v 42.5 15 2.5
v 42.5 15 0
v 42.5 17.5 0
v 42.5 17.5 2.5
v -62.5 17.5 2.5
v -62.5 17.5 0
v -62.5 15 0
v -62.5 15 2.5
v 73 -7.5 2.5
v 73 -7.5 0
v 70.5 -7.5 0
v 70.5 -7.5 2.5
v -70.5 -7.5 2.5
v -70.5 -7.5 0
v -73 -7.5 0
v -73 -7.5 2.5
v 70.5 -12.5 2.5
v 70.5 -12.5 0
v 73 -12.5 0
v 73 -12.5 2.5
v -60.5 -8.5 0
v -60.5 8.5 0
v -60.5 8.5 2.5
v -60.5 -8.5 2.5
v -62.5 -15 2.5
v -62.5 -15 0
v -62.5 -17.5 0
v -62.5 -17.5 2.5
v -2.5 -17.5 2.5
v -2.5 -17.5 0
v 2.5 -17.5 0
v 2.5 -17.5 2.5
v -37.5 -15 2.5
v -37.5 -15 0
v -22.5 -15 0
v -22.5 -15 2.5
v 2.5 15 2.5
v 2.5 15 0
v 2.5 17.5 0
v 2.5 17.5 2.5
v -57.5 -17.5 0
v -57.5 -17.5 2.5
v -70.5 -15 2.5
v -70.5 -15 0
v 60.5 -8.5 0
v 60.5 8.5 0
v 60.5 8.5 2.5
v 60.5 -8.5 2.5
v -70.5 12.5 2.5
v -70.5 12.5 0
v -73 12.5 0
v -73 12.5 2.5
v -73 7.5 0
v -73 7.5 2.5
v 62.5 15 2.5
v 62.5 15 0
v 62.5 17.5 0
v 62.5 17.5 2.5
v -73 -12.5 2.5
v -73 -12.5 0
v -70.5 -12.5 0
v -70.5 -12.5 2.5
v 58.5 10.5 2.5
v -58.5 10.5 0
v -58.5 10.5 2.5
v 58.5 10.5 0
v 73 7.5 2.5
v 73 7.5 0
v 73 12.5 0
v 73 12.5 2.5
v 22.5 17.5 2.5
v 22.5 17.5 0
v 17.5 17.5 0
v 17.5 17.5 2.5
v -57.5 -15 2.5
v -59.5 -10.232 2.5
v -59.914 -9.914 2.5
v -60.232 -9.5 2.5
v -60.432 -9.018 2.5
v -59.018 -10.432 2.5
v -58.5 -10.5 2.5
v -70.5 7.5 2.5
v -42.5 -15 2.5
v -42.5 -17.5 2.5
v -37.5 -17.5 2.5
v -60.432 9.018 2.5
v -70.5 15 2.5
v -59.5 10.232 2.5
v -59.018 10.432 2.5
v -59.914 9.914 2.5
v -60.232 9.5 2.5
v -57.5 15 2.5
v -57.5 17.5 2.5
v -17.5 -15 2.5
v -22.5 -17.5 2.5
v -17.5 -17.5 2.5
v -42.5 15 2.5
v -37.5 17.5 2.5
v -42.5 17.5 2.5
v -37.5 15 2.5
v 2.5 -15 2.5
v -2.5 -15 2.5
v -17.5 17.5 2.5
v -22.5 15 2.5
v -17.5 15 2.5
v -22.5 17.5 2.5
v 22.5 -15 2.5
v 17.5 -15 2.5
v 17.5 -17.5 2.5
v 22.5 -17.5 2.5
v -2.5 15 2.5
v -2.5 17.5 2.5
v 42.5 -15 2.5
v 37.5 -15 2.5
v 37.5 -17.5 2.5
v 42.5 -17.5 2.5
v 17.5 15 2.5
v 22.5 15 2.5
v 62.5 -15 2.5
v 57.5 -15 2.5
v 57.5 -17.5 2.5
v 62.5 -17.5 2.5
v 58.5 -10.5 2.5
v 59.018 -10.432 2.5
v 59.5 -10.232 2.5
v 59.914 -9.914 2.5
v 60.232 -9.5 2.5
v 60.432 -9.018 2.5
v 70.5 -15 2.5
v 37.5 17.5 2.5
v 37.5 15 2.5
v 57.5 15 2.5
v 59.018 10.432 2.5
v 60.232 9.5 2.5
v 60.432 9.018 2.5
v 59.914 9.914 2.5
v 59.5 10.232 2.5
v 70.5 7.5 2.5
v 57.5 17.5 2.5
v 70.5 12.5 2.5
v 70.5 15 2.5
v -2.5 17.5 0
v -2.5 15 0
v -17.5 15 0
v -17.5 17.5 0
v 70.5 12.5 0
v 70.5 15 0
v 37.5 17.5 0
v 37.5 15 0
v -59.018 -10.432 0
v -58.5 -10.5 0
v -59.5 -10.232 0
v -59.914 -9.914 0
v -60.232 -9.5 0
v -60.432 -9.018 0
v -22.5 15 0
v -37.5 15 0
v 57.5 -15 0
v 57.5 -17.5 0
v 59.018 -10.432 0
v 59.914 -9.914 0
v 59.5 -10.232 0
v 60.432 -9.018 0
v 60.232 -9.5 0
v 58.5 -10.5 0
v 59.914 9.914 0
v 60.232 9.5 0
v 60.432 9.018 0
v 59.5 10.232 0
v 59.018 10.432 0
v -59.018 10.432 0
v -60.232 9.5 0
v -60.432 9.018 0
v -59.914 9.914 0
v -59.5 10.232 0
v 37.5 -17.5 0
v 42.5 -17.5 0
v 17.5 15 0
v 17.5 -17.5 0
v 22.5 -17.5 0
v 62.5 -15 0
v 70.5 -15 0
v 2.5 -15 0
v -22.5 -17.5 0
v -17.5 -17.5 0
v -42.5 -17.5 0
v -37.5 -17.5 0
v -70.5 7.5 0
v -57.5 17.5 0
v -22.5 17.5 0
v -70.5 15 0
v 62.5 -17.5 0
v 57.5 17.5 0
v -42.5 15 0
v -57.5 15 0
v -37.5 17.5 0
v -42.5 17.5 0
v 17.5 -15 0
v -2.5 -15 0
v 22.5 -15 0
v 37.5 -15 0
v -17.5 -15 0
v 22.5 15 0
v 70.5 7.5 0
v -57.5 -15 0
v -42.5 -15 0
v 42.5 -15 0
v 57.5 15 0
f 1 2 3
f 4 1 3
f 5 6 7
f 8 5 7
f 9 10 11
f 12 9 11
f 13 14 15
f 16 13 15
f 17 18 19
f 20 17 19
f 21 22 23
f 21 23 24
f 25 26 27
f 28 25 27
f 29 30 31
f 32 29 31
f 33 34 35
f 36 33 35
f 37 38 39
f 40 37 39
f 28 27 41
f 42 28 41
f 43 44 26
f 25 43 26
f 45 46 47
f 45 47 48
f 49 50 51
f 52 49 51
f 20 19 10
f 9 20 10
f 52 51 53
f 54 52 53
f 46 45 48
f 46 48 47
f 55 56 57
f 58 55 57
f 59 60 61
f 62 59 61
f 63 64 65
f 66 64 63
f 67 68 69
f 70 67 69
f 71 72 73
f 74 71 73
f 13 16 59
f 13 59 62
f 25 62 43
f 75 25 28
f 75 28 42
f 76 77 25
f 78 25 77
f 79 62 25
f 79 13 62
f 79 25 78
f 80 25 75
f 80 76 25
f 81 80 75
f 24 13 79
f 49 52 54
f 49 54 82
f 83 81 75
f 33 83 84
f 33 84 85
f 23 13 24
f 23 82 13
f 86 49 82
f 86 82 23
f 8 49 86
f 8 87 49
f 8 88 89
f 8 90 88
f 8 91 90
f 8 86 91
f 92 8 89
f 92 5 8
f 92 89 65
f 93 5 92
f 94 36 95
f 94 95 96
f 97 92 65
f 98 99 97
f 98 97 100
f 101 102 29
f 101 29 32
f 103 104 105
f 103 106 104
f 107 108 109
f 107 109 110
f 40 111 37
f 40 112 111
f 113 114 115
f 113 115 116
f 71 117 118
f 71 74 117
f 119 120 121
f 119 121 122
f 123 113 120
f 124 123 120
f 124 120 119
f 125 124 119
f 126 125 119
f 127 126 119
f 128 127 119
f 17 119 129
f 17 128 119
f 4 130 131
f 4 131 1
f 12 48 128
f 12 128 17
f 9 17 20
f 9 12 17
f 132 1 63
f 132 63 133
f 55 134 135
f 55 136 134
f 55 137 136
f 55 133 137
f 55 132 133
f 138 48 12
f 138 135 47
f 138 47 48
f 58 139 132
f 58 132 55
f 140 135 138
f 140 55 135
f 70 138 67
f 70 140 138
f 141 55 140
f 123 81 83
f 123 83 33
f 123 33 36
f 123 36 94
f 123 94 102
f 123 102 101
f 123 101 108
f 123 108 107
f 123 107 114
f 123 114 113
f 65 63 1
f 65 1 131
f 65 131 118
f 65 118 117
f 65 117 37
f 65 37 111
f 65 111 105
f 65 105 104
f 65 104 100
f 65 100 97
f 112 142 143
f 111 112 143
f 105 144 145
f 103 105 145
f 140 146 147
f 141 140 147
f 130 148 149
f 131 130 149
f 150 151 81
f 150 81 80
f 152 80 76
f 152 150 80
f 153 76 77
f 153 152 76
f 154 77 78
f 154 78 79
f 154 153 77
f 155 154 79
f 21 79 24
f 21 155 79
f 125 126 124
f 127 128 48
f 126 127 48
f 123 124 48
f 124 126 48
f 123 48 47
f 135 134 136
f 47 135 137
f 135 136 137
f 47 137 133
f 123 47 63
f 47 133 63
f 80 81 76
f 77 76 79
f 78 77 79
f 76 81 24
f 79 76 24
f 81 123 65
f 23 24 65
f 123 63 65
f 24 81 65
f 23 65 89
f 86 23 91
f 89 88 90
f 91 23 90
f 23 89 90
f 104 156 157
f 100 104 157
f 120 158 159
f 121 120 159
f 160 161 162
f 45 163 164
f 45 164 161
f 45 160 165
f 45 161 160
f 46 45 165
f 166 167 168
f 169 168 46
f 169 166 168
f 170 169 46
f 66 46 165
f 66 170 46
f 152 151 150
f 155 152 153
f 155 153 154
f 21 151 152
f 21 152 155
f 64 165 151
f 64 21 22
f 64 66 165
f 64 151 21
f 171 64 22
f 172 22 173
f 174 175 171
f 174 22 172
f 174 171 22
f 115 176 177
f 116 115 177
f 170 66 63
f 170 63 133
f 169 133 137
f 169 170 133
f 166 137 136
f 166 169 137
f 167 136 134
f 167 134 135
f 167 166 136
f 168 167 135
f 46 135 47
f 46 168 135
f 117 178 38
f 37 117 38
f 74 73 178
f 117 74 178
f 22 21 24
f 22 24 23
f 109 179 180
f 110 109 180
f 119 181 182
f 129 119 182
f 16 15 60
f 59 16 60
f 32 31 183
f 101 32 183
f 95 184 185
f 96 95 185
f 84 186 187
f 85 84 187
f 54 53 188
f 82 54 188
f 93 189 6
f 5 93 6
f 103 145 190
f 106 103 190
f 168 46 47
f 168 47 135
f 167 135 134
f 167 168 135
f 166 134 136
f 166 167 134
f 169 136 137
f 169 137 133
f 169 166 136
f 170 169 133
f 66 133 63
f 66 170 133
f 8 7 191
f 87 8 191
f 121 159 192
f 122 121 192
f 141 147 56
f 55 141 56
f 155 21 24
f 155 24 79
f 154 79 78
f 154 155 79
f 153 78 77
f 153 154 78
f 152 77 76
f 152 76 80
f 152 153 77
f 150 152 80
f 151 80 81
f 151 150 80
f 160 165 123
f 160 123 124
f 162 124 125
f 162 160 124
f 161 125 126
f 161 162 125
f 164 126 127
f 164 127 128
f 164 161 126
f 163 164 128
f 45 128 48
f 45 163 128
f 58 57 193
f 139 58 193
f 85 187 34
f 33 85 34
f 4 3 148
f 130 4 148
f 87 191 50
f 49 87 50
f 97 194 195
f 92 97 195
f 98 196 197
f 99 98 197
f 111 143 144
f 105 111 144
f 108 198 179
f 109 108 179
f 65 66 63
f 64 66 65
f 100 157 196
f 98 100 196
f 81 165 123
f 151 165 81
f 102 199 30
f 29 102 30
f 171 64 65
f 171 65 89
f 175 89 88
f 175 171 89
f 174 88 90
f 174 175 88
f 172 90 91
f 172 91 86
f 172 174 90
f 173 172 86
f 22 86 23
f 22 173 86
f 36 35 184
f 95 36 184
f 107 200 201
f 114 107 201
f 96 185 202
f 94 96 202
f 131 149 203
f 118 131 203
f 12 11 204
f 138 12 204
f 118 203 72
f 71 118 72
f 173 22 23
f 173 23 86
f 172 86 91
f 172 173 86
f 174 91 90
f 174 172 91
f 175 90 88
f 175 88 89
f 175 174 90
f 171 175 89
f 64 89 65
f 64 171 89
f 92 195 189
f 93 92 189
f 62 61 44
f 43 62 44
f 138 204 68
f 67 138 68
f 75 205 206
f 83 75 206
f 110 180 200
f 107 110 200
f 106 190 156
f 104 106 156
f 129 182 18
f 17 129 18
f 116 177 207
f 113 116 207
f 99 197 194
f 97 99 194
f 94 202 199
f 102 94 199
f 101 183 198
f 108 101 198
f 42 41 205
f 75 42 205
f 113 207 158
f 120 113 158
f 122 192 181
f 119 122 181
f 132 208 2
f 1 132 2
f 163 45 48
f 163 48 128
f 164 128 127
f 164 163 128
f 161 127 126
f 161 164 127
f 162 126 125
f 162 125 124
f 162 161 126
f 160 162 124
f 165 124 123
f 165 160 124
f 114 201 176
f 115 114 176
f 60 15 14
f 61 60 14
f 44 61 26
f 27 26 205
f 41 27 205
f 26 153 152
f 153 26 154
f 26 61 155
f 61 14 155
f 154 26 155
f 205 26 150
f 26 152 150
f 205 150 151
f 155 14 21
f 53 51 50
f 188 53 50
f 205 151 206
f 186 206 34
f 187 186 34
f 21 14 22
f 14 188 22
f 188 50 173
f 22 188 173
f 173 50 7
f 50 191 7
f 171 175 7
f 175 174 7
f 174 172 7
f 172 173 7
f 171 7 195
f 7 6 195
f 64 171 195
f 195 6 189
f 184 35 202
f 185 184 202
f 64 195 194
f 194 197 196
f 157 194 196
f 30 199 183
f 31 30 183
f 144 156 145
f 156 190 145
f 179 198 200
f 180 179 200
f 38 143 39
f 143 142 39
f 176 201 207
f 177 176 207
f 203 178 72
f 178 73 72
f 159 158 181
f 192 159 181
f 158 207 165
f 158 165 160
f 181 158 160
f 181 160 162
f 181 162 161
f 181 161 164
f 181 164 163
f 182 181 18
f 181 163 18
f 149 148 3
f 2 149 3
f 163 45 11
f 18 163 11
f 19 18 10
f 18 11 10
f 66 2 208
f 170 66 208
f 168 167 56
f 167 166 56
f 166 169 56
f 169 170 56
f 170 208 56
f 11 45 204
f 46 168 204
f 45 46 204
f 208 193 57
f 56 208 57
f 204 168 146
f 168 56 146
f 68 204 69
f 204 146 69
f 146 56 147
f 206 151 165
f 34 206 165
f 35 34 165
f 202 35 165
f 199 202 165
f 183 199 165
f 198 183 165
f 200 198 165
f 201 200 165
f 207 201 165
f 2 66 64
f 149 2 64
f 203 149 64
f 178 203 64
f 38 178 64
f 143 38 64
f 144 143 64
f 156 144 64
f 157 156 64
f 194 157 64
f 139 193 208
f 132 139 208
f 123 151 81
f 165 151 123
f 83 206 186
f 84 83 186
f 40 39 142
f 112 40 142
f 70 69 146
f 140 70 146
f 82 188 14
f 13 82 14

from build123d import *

# Parameters (mm, degrees)
BOSS_EXTRUDE1_DEPTH = 2.5
BOSS_EXTRUDE2_DEPTH = 2.5


with BuildPart() as part:
    # Sketch1 → Boss-Extrude1 (new body)
    with BuildSketch(Plane.XY):
        Polygon((-73, -12.5), (-70.5, -12.5), (-70.5, -15), (-62.5, -15), (-62.5, -17.5), (-57.5, -17.5), (-57.5, -15), (-42.5, -15), (-42.5, -17.5), (-37.5, -17.5), (-37.5, -15), (-22.5, -15), (-22.5, -17.5), (-17.5, -17.5), (-17.5, -15), (-2.5, -15), (-2.5, -17.5), (2.5, -17.5), (2.5, -15), (17.5, -15), (17.5, -17.5), (22.5, -17.5), (22.5, -15), (37.5, -15), (37.5, -17.5), (42.5, -17.5), (42.5, -15), (57.5, -15), (57.5, -17.5), (62.5, -17.5), (62.5, -15), (70.5, -15), (70.5, -12.5), (73, -12.5), (73, -7.5), (70.5, -7.5), (70.5, 7.5), (73, 7.5), (73, 12.5), (70.5, 12.5), (70.5, 15), (62.5, 15), (62.5, 17.5), (57.5, 17.5), (57.5, 15), (42.5, 15), (42.5, 17.5), (37.5, 17.5), (37.5, 15), (22.5, 15), (22.5, 17.5), (17.5, 17.5), (17.5, 15), (2.5, 15), (2.5, 17.5), (-2.5, 17.5), (-2.5, 15), (-17.5, 15), (-17.5, 17.5), (-22.5, 17.5), (-22.5, 15), (-37.5, 15), (-37.5, 17.5), (-42.5, 17.5), (-42.5, 15), (-57.5, 15), (-57.5, 17.5), (-62.5, 17.5), (-62.5, 15), (-70.5, 15), (-70.5, 12.5), (-73, 12.5), (-73, 7.5), (-70.5, 7.5), (-70.5, -7.5), (-73, -7.5), align=None)
        with BuildLine():
            Line((58.5, -10.5), (-58.5, -10.5))
            ThreePointArc((-58.5, -10.5), (-59.914213562, -9.914213562), (-60.5, -8.5))
            Line((-60.5, -8.5), (-60.5, 8.5))
            ThreePointArc((-60.5, 8.5), (-59.914213562, 9.914213562), (-58.5, 10.5))
            Line((-58.5, 10.5), (58.5, 10.5))
            ThreePointArc((58.5, 10.5), (59.914213562, 9.914213562), (60.5, 8.5))
            Line((60.5, 8.5), (60.5, -8.5))
            ThreePointArc((60.5, -8.5), (59.914213562, -9.914213562), (58.5, -10.5))
        make_face(mode=Mode.SUBTRACT)
    extrude(amount=BOSS_EXTRUDE1_DEPTH)


with BuildPart() as body_2:
    # Sketch1<3> → Boss-Extrude2 (new body)
    with BuildSketch(Plane.XY):
        with BuildLine():
            ThreePointArc((-60.5, -8.5), (-59.914213562, -9.914213562), (-58.5, -10.5))
            Line((-58.5, -10.5), (58.5, -10.5))
            ThreePointArc((58.5, -10.5), (59.914213562, -9.914213562), (60.5, -8.5))
            Line((60.5, -8.5), (60.5, 8.5))
            ThreePointArc((60.5, 8.5), (59.914213562, 9.914213562), (58.5, 10.5))
            Line((58.5, 10.5), (-58.5, 10.5))
            ThreePointArc((-58.5, 10.5), (-59.914213562, 9.914213562), (-60.5, 8.5))
            Line((-60.5, 8.5), (-60.5, -8.5))
        make_face()
    extrude(amount=BOSS_EXTRUDE2_DEPTH)


solid = Compound([part.part, body_2.part])
